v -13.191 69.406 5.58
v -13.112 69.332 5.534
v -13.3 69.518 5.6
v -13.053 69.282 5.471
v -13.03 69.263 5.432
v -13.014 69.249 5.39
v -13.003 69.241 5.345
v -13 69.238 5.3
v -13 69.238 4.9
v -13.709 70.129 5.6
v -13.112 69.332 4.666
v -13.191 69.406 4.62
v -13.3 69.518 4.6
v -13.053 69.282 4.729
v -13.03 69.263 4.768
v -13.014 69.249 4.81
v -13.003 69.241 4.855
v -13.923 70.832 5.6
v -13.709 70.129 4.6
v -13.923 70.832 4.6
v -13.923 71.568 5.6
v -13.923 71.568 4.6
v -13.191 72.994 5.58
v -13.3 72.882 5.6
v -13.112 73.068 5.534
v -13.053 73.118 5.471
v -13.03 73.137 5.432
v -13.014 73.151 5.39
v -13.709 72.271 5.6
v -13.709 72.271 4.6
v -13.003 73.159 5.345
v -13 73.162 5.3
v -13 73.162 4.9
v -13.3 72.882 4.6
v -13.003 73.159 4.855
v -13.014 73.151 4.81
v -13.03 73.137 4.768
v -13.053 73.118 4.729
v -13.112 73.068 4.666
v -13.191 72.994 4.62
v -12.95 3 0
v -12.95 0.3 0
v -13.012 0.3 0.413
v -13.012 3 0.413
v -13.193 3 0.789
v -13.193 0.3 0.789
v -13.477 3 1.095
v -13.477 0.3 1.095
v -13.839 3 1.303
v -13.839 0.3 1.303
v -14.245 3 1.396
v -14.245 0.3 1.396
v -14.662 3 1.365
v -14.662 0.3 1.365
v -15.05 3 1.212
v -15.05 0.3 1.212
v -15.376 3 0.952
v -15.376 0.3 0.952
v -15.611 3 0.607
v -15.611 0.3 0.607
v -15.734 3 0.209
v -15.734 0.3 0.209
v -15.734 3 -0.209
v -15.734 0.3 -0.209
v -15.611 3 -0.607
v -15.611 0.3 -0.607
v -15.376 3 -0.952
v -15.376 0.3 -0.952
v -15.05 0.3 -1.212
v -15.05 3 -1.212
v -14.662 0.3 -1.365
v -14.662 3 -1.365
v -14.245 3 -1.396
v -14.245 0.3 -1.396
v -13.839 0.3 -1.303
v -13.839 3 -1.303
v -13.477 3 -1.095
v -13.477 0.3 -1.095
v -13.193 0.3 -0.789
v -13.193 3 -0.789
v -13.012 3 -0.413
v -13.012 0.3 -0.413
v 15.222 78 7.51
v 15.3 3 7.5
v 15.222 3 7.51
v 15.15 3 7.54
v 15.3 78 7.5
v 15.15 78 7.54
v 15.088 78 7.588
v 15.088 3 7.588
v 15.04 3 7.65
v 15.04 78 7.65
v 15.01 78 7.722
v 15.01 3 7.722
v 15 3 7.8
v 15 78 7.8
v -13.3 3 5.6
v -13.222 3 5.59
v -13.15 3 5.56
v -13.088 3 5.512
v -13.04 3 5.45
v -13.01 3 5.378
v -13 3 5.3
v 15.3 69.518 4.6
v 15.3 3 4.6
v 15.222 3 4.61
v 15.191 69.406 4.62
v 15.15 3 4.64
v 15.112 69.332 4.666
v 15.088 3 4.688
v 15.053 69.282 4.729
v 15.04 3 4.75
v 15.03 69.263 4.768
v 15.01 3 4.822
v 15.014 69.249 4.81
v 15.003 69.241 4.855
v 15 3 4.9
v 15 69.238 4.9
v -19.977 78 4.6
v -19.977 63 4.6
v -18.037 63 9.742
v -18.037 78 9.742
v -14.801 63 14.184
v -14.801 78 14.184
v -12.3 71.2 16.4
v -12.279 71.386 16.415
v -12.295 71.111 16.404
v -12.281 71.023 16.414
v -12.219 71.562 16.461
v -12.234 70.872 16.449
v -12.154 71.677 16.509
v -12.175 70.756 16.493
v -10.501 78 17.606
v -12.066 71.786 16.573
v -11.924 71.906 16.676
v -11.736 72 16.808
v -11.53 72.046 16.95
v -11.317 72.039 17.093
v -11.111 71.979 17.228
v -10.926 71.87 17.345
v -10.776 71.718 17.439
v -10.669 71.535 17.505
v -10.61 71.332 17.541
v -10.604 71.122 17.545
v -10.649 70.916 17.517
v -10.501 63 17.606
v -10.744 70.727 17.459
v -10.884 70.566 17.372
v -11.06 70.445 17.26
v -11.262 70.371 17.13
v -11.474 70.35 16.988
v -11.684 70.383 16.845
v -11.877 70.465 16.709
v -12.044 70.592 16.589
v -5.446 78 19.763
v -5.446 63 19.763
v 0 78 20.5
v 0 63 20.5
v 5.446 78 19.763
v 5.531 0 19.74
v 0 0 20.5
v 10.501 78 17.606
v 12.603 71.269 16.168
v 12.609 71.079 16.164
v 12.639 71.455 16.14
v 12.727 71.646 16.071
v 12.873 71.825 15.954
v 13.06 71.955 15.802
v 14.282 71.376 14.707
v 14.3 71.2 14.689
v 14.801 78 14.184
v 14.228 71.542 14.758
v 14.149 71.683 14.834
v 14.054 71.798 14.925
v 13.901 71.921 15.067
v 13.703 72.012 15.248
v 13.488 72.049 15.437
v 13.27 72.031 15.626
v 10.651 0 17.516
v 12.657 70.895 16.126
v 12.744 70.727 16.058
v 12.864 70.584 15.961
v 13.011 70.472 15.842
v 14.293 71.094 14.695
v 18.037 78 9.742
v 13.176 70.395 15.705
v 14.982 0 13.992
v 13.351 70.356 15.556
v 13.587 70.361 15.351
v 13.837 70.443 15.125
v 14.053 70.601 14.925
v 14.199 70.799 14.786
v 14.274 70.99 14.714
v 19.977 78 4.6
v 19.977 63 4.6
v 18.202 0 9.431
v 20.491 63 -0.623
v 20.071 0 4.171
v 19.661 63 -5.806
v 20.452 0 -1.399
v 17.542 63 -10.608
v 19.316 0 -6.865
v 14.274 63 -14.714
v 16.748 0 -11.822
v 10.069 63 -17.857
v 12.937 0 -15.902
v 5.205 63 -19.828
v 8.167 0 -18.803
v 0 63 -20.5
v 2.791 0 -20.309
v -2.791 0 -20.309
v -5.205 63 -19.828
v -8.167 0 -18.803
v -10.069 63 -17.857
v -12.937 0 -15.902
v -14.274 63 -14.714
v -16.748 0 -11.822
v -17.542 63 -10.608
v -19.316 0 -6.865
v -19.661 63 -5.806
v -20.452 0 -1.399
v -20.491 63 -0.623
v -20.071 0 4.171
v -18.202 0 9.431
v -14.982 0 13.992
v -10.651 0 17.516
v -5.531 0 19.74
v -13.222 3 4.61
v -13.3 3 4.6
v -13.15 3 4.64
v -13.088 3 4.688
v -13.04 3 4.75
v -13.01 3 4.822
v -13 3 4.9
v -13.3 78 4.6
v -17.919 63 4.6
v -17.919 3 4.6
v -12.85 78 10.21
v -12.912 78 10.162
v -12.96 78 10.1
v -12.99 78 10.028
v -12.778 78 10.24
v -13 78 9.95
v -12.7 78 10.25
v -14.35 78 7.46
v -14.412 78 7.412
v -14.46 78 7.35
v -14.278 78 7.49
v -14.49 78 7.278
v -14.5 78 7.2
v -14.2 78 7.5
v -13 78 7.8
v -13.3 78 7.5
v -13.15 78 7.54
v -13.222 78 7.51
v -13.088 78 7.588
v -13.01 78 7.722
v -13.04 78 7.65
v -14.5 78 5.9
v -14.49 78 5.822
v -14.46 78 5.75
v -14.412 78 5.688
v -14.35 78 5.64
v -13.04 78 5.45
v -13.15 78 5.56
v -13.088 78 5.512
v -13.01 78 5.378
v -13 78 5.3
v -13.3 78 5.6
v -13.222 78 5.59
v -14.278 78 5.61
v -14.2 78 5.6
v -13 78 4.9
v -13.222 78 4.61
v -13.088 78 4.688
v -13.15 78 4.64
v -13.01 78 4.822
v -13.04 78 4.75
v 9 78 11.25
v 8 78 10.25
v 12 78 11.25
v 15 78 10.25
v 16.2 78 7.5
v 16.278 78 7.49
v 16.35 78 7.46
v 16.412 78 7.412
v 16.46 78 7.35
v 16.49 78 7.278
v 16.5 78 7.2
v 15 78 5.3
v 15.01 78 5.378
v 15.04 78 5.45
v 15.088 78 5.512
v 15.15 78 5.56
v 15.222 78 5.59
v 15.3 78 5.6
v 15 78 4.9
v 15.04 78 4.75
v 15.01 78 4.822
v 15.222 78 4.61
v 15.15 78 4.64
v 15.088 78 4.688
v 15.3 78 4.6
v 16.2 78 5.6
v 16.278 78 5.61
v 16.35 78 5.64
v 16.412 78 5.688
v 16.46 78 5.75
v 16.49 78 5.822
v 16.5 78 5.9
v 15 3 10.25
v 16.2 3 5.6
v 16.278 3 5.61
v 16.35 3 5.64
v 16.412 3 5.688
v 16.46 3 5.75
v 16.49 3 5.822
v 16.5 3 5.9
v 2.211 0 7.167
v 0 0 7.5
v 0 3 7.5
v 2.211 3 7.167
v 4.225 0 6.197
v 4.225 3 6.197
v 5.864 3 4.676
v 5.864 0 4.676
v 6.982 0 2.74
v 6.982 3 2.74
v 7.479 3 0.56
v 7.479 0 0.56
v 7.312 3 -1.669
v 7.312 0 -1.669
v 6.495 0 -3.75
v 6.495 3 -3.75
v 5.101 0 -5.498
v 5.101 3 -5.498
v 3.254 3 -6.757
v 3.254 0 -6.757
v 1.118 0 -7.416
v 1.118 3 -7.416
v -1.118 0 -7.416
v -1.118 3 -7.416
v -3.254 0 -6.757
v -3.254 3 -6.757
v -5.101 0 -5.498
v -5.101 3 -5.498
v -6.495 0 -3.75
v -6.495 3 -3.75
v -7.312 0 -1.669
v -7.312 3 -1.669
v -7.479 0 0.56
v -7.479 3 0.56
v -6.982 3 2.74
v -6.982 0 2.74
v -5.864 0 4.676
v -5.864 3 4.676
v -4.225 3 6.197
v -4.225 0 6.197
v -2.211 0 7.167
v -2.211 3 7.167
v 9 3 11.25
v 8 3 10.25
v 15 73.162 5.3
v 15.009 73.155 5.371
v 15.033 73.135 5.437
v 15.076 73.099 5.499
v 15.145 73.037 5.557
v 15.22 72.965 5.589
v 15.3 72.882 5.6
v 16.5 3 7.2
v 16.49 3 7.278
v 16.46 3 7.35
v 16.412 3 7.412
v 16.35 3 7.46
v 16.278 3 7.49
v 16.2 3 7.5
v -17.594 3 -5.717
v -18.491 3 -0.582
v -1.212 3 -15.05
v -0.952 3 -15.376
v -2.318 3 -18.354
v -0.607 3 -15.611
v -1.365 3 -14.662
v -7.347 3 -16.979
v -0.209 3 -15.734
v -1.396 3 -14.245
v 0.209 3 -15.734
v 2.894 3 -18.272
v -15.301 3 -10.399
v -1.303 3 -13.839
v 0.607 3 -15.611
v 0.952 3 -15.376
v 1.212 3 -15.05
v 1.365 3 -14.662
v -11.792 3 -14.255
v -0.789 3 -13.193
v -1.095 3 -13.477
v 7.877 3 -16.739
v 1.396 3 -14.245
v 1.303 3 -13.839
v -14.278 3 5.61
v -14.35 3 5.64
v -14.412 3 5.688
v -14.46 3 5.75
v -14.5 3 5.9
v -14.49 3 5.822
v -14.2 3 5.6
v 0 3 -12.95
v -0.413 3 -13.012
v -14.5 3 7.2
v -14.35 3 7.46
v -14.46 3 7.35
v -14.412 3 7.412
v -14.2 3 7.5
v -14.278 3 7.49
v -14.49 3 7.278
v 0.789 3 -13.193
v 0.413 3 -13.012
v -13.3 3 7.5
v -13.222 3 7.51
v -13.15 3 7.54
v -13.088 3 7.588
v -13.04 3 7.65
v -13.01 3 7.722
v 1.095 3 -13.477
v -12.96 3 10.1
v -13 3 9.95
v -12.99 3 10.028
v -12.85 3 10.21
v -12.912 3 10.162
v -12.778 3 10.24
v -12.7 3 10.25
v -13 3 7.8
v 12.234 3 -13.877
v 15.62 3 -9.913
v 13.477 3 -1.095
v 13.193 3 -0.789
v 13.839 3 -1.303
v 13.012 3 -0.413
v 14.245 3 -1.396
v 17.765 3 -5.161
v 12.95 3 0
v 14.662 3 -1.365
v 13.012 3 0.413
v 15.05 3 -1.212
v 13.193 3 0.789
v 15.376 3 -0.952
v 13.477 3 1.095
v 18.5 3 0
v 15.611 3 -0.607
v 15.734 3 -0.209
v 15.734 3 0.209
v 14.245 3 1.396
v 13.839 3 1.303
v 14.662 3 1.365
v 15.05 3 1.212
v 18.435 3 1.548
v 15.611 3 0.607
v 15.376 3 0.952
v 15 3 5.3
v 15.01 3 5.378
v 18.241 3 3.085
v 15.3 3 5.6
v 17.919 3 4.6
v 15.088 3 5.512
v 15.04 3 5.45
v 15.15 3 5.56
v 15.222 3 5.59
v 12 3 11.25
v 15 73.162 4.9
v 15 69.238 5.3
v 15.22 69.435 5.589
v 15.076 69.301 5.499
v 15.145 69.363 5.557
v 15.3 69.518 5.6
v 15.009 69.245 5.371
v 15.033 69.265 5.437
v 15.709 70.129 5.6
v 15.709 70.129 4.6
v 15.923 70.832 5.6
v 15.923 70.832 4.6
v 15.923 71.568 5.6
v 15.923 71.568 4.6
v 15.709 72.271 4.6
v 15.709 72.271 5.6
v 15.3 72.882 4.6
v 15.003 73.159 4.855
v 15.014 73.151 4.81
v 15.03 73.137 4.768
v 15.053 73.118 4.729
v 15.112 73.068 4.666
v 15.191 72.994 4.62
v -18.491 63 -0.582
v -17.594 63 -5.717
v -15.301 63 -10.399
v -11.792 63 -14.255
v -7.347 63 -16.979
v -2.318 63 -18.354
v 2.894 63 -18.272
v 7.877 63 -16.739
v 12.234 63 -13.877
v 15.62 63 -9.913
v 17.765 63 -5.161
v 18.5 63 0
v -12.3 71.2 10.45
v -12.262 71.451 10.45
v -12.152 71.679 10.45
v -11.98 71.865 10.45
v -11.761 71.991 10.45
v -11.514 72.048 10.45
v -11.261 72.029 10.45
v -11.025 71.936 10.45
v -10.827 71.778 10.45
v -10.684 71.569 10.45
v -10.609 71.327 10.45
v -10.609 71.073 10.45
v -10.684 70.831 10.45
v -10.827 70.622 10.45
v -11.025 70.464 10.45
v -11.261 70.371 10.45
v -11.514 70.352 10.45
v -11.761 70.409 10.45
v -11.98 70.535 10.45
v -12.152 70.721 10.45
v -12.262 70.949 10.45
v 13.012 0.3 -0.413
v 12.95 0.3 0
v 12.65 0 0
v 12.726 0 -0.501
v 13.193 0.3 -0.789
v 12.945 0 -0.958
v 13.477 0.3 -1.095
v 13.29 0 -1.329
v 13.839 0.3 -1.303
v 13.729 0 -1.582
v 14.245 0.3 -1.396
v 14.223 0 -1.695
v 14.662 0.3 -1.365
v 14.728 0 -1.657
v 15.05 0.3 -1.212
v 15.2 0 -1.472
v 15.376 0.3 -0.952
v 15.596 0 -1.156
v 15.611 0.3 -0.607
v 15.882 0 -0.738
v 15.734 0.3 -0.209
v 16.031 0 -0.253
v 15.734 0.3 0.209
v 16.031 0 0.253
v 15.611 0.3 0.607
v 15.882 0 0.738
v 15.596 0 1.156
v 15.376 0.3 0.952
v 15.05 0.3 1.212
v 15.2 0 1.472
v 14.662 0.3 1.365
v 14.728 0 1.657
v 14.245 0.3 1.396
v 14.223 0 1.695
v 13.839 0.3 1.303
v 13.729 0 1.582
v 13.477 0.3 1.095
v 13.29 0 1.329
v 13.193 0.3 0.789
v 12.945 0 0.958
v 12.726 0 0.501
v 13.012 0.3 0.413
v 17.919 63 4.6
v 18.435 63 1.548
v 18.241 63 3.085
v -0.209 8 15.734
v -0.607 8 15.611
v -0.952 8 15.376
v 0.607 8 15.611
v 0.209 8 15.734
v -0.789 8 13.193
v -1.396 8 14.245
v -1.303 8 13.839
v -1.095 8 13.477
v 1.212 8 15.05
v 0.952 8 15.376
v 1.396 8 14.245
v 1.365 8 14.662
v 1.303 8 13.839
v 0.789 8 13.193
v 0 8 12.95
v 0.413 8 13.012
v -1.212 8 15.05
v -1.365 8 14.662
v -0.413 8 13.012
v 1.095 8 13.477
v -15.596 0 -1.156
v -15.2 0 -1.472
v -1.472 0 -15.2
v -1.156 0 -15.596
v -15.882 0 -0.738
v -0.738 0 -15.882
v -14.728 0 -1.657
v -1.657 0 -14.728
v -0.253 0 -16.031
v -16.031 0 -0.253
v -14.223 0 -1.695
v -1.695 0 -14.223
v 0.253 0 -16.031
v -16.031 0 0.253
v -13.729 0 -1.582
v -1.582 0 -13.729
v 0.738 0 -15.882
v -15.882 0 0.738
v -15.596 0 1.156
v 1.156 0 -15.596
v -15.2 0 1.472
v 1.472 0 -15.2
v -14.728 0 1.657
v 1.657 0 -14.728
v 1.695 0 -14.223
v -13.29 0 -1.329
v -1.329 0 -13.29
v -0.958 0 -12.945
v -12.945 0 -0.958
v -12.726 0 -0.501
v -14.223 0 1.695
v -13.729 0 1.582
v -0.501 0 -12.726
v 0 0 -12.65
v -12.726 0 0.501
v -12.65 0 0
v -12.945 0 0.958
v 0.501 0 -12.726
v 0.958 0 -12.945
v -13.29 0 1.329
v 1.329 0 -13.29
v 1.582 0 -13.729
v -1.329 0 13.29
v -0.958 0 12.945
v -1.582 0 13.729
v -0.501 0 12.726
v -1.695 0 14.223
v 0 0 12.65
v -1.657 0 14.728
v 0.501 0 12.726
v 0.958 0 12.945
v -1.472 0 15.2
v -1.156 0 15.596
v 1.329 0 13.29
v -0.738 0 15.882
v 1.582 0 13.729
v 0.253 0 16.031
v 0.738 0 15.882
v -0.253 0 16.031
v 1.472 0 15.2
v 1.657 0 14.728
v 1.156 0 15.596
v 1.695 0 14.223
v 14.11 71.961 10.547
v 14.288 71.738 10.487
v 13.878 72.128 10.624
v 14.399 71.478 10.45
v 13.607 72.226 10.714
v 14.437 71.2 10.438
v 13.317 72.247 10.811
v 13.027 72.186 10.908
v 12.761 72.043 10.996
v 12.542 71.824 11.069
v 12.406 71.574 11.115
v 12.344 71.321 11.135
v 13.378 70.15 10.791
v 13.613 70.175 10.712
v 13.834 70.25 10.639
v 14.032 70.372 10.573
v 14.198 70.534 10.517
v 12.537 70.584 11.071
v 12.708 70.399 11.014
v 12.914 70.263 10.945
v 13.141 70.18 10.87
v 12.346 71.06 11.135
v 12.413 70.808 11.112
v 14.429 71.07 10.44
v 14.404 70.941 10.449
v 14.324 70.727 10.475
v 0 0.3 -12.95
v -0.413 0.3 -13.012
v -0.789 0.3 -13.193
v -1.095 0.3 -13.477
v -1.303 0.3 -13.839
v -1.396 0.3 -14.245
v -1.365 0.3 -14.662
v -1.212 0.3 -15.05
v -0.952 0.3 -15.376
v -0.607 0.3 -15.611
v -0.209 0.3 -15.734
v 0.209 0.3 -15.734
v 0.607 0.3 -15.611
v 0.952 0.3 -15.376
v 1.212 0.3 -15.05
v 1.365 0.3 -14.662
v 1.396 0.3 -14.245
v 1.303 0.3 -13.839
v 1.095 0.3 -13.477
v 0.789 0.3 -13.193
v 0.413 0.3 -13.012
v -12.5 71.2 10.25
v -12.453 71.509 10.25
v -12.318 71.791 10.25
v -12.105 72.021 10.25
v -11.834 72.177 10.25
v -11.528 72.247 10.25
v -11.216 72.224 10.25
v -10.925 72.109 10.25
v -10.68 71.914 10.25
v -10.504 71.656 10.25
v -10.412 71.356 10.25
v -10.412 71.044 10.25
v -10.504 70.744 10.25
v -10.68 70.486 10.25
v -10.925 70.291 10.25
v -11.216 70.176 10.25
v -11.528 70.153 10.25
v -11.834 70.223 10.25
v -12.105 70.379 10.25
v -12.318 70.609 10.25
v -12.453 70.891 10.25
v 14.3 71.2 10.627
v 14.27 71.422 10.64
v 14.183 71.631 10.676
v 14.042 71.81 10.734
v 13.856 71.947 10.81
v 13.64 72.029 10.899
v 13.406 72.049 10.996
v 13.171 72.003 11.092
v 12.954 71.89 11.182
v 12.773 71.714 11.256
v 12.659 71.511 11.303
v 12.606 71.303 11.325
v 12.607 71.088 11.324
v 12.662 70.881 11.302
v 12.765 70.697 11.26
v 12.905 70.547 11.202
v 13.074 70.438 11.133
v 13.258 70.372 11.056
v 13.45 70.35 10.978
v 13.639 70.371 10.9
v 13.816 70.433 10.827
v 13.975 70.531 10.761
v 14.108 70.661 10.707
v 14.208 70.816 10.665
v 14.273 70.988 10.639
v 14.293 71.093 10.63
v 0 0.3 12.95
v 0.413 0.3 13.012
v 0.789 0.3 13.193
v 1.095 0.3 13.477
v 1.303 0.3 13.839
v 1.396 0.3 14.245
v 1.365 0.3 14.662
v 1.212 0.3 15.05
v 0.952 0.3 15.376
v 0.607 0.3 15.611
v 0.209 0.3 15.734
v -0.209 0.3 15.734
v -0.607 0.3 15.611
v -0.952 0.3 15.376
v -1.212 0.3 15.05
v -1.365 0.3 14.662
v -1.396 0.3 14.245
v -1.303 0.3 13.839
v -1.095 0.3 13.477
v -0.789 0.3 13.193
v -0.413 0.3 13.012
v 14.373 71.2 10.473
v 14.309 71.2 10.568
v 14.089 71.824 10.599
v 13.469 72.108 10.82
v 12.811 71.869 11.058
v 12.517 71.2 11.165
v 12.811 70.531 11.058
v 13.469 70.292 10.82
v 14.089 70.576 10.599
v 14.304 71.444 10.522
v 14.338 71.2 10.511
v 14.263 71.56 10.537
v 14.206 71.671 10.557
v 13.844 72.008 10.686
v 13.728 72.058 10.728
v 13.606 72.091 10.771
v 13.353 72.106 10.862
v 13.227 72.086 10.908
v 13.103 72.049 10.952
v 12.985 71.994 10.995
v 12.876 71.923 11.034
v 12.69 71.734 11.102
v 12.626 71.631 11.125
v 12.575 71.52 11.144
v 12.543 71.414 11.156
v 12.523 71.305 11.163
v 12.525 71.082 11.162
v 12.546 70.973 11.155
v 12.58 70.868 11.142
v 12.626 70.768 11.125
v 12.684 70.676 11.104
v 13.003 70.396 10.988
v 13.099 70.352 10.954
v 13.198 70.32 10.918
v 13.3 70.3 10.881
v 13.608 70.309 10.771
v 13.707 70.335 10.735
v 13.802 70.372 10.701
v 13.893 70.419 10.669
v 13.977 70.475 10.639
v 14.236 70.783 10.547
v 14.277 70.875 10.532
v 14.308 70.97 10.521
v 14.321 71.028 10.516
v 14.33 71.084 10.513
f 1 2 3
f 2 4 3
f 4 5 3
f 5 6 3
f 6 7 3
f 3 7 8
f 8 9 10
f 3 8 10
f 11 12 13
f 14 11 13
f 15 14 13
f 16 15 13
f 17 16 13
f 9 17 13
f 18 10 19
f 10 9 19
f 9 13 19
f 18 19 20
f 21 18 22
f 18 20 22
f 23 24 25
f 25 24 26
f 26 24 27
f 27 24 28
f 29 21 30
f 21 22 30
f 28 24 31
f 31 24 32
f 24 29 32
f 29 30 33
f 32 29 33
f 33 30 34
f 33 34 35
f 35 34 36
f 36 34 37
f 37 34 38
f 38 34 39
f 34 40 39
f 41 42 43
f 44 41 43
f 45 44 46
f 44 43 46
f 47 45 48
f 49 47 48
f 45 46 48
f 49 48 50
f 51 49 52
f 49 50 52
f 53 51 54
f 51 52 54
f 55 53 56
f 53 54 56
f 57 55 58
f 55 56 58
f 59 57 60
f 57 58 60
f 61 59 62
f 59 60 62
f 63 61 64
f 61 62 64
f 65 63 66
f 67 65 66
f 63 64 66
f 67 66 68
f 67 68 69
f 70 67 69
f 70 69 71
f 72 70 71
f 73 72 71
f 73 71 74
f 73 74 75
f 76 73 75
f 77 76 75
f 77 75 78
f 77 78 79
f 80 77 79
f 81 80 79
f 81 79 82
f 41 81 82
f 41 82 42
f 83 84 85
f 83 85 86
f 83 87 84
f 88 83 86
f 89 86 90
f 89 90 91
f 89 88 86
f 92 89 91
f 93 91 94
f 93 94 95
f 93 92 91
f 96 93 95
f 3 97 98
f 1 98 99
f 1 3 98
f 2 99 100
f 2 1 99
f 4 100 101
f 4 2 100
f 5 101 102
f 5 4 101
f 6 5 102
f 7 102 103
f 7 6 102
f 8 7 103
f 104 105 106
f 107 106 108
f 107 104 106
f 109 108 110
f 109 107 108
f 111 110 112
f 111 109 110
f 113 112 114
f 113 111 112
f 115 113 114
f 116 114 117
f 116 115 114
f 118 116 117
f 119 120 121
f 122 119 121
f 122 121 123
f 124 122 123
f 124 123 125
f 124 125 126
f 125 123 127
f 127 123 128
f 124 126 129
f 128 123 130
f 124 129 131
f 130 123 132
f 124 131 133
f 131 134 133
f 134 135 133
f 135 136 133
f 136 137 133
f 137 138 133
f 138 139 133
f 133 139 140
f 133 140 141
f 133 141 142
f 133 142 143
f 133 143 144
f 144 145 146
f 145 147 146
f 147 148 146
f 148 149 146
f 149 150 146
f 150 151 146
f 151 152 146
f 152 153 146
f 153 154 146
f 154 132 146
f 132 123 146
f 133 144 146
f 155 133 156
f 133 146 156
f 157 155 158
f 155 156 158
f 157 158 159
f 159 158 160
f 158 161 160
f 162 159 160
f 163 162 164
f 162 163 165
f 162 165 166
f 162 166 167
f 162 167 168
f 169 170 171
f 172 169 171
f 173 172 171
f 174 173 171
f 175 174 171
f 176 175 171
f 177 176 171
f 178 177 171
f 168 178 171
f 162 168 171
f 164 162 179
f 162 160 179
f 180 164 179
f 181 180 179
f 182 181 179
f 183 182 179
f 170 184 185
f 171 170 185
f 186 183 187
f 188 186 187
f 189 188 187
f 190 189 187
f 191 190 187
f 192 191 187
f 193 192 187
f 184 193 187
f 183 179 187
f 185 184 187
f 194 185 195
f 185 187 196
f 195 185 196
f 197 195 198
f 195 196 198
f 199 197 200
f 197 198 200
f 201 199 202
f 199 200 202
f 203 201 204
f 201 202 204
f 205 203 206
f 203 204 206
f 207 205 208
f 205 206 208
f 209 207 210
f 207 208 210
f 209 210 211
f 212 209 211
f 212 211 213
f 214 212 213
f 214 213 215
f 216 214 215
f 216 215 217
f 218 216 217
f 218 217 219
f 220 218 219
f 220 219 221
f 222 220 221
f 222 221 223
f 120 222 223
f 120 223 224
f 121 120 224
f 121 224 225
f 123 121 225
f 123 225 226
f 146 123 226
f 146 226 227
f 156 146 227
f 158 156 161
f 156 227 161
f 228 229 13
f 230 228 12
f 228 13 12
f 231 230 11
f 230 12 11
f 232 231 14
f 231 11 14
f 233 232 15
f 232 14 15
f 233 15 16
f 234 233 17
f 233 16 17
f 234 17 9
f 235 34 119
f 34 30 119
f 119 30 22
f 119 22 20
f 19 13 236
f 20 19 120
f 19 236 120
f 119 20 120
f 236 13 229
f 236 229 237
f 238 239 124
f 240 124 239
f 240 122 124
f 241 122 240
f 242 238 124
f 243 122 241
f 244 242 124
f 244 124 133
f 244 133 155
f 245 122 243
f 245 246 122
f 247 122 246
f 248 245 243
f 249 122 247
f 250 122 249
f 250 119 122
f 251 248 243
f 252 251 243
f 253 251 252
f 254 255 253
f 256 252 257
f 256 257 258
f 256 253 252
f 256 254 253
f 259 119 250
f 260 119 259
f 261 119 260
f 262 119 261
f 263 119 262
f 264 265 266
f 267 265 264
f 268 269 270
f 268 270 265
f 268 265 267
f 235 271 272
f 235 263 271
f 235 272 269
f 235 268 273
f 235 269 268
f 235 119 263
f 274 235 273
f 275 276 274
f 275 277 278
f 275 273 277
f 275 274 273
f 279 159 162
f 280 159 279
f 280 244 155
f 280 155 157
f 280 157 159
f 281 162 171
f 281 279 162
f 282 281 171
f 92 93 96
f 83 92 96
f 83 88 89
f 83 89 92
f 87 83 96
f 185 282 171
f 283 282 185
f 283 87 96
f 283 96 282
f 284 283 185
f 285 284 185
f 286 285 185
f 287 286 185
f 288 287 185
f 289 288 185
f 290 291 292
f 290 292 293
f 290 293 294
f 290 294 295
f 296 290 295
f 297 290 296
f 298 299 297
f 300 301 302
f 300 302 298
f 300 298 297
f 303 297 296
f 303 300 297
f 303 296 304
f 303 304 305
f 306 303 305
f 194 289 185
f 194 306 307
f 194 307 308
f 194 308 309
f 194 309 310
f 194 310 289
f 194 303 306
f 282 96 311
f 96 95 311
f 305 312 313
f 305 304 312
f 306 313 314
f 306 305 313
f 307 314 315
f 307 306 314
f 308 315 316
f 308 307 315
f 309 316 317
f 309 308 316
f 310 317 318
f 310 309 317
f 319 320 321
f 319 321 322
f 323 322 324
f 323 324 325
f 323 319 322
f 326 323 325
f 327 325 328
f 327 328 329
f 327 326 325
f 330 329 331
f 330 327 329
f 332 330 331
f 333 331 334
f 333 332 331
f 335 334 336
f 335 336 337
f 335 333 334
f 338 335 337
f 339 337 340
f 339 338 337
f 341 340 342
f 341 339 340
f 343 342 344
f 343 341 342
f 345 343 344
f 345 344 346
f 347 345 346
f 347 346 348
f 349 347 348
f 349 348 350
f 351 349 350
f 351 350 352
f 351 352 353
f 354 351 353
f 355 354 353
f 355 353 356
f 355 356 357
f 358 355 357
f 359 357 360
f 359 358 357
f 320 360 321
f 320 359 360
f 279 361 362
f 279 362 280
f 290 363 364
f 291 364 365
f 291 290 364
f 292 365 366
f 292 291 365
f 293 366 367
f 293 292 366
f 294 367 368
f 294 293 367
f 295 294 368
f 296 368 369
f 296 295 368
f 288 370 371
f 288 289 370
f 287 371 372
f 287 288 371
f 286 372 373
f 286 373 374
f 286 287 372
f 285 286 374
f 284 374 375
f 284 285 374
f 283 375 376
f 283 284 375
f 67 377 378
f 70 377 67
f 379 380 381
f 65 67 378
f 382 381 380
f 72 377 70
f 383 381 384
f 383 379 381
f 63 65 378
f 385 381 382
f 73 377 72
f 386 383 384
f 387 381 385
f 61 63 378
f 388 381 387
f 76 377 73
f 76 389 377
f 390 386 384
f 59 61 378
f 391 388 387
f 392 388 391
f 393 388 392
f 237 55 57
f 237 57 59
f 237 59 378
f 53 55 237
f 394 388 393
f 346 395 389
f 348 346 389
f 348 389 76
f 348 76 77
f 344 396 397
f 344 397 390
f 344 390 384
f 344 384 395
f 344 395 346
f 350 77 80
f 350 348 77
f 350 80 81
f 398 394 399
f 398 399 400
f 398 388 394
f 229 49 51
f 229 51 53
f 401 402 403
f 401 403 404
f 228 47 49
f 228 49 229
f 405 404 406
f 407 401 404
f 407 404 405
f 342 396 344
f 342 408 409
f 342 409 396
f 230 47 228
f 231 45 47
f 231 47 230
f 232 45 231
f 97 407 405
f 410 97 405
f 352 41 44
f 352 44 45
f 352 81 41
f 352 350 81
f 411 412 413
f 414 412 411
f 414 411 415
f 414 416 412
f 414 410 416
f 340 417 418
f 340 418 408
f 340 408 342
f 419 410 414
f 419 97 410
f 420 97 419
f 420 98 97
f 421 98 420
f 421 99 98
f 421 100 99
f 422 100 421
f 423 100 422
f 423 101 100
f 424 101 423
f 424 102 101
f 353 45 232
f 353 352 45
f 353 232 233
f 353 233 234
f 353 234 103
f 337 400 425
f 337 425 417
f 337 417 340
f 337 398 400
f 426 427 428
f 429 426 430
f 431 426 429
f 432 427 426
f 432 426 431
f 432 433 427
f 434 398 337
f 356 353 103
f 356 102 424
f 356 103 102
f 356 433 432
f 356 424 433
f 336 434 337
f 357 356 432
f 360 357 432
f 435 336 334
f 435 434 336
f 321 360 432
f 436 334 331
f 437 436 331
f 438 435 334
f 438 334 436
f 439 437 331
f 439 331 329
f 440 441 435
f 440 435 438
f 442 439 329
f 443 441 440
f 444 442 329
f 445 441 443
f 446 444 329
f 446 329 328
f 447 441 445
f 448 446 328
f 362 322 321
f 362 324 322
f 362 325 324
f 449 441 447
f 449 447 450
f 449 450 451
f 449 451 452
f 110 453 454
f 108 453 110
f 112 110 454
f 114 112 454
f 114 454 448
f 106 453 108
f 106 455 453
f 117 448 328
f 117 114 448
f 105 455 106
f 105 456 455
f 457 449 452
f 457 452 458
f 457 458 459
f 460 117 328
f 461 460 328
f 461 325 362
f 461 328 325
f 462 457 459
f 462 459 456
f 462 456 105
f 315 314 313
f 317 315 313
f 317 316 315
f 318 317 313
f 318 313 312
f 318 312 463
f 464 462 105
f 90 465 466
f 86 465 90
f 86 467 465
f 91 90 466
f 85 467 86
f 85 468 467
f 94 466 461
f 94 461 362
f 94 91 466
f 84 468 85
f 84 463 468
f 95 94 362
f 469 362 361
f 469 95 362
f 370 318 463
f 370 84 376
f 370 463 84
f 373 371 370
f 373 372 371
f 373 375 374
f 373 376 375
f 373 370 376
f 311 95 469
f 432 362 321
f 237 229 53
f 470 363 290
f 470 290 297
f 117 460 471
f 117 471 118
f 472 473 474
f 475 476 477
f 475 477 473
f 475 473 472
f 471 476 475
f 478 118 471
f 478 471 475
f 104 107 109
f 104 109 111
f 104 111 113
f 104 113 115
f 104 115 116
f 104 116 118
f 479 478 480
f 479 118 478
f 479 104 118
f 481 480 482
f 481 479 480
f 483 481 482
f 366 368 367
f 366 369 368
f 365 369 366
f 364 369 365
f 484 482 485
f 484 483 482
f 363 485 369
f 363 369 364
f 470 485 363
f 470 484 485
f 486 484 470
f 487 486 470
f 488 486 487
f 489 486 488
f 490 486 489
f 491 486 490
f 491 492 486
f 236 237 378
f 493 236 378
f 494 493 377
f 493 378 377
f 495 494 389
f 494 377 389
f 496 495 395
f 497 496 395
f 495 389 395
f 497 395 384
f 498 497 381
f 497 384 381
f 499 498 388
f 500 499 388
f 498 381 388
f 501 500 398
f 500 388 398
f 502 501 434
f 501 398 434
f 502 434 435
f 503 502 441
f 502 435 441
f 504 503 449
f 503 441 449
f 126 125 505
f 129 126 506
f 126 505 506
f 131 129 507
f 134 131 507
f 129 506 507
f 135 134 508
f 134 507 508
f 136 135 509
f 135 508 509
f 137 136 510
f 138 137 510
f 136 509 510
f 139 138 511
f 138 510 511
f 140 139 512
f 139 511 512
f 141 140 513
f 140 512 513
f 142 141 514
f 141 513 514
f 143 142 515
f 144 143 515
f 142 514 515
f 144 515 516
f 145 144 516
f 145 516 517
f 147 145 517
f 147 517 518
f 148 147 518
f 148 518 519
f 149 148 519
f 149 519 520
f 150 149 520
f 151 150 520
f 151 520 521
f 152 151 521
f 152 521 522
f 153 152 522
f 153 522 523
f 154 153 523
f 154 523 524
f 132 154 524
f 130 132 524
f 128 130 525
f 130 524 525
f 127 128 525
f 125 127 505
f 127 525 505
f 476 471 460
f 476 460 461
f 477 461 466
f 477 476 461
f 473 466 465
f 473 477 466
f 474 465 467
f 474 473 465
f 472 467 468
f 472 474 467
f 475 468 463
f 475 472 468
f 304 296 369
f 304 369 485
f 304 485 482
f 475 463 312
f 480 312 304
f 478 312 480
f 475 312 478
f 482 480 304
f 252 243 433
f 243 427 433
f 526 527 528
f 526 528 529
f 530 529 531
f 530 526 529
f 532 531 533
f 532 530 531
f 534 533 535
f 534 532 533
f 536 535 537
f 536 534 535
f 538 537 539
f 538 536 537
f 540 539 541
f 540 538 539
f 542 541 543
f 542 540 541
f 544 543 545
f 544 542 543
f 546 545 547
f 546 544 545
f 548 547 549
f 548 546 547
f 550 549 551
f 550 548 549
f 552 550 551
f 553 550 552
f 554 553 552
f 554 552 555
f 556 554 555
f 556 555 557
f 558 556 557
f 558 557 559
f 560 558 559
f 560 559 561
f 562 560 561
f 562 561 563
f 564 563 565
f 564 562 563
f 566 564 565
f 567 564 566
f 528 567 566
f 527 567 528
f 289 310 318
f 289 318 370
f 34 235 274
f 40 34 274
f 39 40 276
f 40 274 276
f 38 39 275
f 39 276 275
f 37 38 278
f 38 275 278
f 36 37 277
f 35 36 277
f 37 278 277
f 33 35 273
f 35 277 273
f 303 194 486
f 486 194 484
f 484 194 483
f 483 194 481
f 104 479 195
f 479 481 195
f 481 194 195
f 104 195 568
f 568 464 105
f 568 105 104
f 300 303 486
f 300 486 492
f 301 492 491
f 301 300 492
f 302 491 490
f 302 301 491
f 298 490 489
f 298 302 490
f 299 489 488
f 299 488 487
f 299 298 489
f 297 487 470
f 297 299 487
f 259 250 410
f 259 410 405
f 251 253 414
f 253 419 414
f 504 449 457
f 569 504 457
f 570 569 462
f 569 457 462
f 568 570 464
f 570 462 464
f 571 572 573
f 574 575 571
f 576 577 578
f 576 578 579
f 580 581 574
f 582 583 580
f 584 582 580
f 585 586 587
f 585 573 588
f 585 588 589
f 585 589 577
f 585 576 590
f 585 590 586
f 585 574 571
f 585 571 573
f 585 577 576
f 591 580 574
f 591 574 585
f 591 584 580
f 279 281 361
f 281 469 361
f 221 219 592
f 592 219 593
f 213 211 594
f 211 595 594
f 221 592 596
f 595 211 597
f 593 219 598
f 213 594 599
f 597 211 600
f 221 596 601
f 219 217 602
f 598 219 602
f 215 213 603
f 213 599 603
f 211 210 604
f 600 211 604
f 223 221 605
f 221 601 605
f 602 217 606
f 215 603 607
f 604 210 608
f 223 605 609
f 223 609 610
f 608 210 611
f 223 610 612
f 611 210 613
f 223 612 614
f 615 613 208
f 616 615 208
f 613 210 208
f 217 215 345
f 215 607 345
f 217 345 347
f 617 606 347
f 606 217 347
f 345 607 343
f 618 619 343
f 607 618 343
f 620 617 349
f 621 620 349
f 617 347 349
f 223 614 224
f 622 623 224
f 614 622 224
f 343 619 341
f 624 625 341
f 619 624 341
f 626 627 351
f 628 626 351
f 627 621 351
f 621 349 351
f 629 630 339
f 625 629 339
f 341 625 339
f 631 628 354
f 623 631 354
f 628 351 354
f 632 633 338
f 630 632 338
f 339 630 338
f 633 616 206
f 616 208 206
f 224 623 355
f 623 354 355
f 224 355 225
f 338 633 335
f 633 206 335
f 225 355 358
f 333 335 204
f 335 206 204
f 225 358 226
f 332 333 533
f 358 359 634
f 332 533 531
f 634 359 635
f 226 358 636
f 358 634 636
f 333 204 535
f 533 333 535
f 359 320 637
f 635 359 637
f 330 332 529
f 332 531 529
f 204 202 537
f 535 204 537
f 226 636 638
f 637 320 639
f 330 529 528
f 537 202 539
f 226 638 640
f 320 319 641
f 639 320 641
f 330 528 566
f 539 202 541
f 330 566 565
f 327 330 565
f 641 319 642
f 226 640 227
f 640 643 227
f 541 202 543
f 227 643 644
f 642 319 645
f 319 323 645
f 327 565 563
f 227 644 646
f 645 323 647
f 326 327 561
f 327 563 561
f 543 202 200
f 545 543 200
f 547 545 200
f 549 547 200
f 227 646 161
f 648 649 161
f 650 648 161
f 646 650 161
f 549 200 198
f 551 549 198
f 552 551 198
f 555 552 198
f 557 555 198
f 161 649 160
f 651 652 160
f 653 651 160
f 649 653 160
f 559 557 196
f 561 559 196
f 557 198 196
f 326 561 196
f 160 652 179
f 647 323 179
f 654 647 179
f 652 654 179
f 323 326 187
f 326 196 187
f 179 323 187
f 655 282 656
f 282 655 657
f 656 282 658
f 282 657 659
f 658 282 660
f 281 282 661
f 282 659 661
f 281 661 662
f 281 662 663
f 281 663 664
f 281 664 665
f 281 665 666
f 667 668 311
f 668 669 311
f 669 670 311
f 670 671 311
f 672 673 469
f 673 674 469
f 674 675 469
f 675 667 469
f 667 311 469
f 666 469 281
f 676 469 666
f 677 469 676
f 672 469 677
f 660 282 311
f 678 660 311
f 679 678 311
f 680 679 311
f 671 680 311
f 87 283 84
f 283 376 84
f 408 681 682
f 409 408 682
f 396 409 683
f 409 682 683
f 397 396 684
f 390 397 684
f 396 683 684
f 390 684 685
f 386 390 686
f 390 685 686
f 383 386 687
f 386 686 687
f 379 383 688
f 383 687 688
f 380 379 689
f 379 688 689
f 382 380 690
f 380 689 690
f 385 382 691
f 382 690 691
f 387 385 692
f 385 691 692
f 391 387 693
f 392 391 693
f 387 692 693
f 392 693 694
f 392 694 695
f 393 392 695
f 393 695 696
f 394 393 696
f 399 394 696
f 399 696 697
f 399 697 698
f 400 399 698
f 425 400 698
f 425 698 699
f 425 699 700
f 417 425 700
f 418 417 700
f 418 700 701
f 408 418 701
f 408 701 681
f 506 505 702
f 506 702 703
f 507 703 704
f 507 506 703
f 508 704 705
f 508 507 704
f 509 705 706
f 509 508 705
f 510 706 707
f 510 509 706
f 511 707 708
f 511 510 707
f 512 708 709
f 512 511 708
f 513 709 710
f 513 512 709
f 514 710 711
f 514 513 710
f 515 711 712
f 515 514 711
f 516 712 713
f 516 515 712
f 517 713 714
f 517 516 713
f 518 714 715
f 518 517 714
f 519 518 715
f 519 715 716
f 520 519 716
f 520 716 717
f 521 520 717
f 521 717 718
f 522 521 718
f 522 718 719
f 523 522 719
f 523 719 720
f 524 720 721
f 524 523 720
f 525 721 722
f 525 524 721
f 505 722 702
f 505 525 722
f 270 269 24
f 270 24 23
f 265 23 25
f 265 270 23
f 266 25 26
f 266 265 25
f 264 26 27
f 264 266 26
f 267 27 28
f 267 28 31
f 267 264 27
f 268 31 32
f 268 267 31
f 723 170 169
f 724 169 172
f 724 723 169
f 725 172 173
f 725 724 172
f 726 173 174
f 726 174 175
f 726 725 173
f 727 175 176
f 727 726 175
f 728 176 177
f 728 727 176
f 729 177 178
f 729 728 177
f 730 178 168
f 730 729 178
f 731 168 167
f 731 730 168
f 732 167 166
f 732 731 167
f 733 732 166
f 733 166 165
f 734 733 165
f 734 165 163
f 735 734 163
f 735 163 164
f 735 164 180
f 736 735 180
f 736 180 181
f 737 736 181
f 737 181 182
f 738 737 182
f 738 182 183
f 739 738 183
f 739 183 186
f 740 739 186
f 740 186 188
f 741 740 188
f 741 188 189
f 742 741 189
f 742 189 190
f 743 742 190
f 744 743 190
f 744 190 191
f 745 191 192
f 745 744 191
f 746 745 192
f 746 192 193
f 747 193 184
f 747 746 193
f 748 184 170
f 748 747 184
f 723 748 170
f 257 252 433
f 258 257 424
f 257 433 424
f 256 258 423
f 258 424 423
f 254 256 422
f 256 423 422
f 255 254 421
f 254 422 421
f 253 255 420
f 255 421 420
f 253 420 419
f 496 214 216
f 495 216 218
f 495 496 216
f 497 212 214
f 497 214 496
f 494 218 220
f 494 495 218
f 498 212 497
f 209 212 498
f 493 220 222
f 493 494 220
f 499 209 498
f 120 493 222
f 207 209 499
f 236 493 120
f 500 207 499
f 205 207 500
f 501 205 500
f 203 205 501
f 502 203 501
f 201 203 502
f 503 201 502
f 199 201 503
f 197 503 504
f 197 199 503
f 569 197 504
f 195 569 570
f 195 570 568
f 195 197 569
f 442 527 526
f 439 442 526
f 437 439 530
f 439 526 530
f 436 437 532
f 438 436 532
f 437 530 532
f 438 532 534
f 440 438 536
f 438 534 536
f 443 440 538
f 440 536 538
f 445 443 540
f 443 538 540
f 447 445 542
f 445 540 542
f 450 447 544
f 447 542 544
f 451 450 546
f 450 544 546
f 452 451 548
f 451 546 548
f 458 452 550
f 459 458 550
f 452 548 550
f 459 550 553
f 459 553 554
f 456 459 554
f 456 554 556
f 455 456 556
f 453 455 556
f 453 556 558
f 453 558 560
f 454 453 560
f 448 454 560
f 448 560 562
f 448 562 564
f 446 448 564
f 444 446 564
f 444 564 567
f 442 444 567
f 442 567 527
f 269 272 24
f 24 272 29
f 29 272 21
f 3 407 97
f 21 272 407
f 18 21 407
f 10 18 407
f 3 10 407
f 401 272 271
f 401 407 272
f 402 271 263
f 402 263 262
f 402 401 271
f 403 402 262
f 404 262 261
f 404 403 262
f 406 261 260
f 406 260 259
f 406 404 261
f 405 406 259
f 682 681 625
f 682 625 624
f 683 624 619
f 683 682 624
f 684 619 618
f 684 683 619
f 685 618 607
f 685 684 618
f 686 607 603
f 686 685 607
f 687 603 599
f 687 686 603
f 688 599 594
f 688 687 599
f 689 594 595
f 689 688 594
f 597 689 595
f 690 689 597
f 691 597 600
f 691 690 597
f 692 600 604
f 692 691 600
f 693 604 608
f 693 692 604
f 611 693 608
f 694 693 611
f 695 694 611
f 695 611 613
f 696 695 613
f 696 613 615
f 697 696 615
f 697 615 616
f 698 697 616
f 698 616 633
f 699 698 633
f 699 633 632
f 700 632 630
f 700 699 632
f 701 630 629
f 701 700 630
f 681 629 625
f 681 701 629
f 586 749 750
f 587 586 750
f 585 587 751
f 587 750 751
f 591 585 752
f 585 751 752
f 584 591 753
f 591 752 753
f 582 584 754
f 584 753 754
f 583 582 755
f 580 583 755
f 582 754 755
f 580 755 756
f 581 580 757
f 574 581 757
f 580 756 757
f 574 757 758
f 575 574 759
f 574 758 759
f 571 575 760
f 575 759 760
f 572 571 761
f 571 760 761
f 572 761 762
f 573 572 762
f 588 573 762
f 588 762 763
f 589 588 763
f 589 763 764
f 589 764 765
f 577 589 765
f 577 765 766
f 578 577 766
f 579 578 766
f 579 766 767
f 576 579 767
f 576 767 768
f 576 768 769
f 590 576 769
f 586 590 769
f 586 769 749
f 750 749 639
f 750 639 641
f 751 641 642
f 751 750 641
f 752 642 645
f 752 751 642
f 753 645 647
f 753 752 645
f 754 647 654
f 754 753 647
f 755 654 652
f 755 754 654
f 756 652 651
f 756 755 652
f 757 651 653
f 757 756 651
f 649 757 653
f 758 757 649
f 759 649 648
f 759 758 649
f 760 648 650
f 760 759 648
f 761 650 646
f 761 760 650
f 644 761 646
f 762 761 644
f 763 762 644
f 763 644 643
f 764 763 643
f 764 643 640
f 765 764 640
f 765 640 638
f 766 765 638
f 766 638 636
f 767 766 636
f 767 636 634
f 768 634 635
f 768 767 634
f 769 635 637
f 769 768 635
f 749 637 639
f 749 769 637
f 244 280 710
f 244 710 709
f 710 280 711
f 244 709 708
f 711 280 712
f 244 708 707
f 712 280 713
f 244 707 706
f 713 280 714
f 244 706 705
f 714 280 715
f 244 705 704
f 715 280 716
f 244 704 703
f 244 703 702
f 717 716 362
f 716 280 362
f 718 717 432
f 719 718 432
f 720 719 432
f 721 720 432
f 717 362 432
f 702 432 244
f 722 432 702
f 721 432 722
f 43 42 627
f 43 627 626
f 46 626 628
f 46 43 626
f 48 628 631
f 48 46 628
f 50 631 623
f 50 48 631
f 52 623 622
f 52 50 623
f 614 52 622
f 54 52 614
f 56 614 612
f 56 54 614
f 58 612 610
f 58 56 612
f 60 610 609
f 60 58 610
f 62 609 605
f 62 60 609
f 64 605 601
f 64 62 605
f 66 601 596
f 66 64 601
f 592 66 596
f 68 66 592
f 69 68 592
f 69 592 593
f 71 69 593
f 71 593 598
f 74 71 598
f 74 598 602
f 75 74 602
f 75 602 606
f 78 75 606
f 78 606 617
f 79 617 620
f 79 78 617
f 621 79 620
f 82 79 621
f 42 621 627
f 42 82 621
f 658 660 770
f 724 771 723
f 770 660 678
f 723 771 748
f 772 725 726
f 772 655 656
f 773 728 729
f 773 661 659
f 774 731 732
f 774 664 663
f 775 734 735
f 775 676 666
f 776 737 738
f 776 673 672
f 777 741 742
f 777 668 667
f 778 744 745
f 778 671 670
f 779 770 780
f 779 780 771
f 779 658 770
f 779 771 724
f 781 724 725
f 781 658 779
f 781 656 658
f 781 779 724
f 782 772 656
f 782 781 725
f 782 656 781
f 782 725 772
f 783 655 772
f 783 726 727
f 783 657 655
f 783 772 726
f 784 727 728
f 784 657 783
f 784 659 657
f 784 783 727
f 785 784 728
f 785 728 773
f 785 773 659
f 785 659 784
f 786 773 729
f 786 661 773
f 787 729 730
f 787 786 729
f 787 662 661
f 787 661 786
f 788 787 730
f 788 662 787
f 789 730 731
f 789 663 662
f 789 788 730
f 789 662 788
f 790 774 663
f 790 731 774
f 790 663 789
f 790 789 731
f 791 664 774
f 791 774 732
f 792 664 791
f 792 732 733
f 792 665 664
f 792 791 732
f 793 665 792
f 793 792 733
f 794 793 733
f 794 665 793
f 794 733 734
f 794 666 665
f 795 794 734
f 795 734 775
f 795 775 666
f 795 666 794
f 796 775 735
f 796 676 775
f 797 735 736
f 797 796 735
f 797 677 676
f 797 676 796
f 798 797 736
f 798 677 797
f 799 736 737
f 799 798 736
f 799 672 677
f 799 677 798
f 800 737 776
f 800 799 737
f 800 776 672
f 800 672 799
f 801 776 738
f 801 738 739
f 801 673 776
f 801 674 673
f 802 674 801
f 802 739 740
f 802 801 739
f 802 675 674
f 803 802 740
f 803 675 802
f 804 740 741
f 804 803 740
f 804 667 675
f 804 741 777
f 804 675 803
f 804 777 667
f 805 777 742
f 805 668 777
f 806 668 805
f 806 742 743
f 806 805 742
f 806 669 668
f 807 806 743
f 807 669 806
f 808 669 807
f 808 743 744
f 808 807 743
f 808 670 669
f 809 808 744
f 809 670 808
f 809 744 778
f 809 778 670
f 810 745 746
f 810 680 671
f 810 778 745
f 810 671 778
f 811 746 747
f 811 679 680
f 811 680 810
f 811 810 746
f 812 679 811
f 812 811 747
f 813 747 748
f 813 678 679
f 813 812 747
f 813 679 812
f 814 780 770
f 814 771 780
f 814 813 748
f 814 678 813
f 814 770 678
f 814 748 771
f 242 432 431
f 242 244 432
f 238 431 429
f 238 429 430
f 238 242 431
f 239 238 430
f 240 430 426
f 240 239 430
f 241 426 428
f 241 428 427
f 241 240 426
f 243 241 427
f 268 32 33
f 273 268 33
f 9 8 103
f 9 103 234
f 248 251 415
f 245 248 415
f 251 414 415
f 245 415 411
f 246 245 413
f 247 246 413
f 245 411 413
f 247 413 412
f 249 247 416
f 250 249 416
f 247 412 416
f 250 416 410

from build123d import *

# Parameters (mm, degrees)
SKETCH1_R                    = 20.5
SKETCH1_R_2                  = 7.5
BOSS_EXTRUDE1_DEPTH          = 3
SKETCH3_R                    = 1.4
CUT_EXTRUDE1_DEPTH           = 5
CHAMFER6_SIZE                = 0.3
CIRPATTERN2_COUNT            = 4
CHAMFER6_OF_CIRPATTERN2_SIZE = 0.3
SKETCH4_R                    = 20.5
SKETCH4_R_2                  = 1.4
SKETCH4_W                    = 1.5
SKETCH4_H                    = 1
BOSS_EXTRUDE2_DEPTH          = 60
SKETCH6_W                    = 1.5
SKETCH6_H                    = 1
BOSS_EXTRUDE4_DEPTH          = 15
FILLET1_R                    = 0.3
SKETCH7_R                    = 2.5
CUT_EXTRUDE2_DEPTH           = 1.5
SKETCH8_R                    = 0.85
CUT_EXTRUDE3_DEPTH           = 86.371248179
CHAMFER2_SIZE                = 0.2
CHAMFER4_SIZE                = 1
CHAMFER5_R                   = 0.2
SKETCH9_R                    = 1.4
CUT_EXTRUDE4_DEPTH           = 5


with BuildPart() as part:
    # Sketch1 → Boss-Extrude1 (new body)
    with BuildSketch(Plane(origin=(0, 0, 0), x_dir=(1, 0, 0), z_dir=(0, 1, 0))):
        with Locations(Location((0, 0, 0), (0, 0, 270))):
            Circle(SKETCH1_R)
        with Locations(Location((0, 0, 0), (0, 0, 270))):
            Circle(SKETCH1_R_2, mode=Mode.SUBTRACT)
    extrude(amount=BOSS_EXTRUDE1_DEPTH)

    # Sketch3 → Cut-Extrude1 (cut)
    with BuildSketch(Plane.XZ):
        with Locations(Location((0, 14.35, 0), (0, 0, 270))):
            Circle(SKETCH3_R)
    cut_extrude1 = extrude(amount=-CUT_EXTRUDE1_DEPTH, mode=Mode.SUBTRACT)

    # Chamfer6
    chamfer6_edges = [part.edges().sort_by_distance(p)[0] for p in [
        (0, 0, 15.75),
    ]]
    chamfer(chamfer6_edges, length=CHAMFER6_SIZE)

    # CirPattern2: Cut-Extrude1 ×4 about axis
    cirpattern2_axis = Axis((0, 0, 0), (0, 1, 0))
    for i in range(1, CIRPATTERN2_COUNT):
        add(cut_extrude1.rotate(cirpattern2_axis, i * 360 / CIRPATTERN2_COUNT), mode=Mode.SUBTRACT)

    # Chamfer6 of CirPattern2
    chamfer6_of_cirpattern2_edges = [part.edges().sort_by_distance(p)[0] for p in [
        (15.75, 0, 0),
        (0, 0, -15.75),
        (-15.75, 0, 0),
    ]]
    chamfer(chamfer6_of_cirpattern2_edges, length=CHAMFER6_OF_CIRPATTERN2_SIZE)

    # Sketch4 → Boss-Extrude2 (add)
    # profile 1 of 8: a face of its own
    with BuildSketch(Plane(origin=(0, 3, 0), x_dir=(1, 0, 0), z_dir=(0, 1, 0))):
        with Locations(Location((0, 0, 0), (0, 0, 270))):
            Circle(SKETCH4_R)
        with BuildLine():
            ThreePointArc((14.686303143, -11.25), (-3.697050438, -18.126825923), (-17.918984346, -4.6))
            ThreePointArc((-17.918984346, -4.6), (-2.318274099, 18.35417133), (18.5, 0))
            ThreePointArc((18.5, 0), (18.35417133, -2.318274099), (17.918984346, -4.6))
            ThreePointArc((17.918984346, -4.6), (16.751492877, -7.85095449), (15, -10.828203914))
            Line((15, -10.828203914), (15, -11.25))
            Line((15, -11.25), (14.686303143, -11.25))
        make_face(mode=Mode.SUBTRACT)
    # profile 2 of 8: a face of its own
    with BuildSketch(Plane(origin=(0, 3, 0), x_dir=(1, 0, 0), z_dir=(0, 1, 0))):
        with BuildLine():
            Line((-14.5, -7.5), (-14.5, -5.6))
            Line((-14.5, -5.6), (-14.5, -4.6))
            Line((-14.5, -4.6), (-17.918984346, -4.6))
            ThreePointArc((-17.918984346, -4.6), (-3.697050438, -18.126825923), (14.686303143, -11.25))
            Line((14.686303143, -11.25), (12, -11.25))
            Line((12, -11.25), (9, -11.25))
            Line((9, -11.25), (9, -10.25))
            Line((9, -10.25), (-13, -10.25))
            Line((-13, -10.25), (-13, -7.5))
            Line((-13, -7.5), (-14.5, -7.5))
        make_face()
        with Locations(Location((0, -14.35, 0), (0, 0, 270))):
            Circle(SKETCH4_R_2, mode=Mode.SUBTRACT)
    # profile 3 of 8: a face of its own
    with BuildSketch(Plane(origin=(0, 3, 0), x_dir=(1, 0, 0), z_dir=(0, 1, 0))):
        with BuildLine():
            Line((16.5, -4.6), (16.5, -5.6))
            Line((16.5, -5.6), (16.5, -7.5))
            Line((16.5, -7.5), (15, -7.5))
            Line((15, -7.5), (15, -10.25))
            Line((15, -10.25), (15, -10.828203914))
            ThreePointArc((15, -10.828203914), (16.751492877, -7.85095449), (17.918984346, -4.6))
            Line((17.918984346, -4.6), (16.5, -4.6))
        make_face()
    # profile 4 of 8: a face of its own
    with BuildSketch(Plane(origin=(0, 3, 0), x_dir=(1, 0, 0), z_dir=(0, 1, 0))):
        with BuildLine():
            Line((12, -11.25), (14.686303143, -11.25))
            ThreePointArc((14.686303143, -11.25), (14.844649762, -11.040216187), (15, -10.828203914))
            Line((15, -10.828203914), (15, -10.25))
            Line((15, -10.25), (12, -11.25))
        make_face()
    # profile 5 of 8: a face of its own
    with BuildSketch(Plane(origin=(0, 3, 0), x_dir=(1, 0, 0), z_dir=(0, 1, 0))):
        with Locations((15.75, -5.1)):
            Rectangle(SKETCH4_W, SKETCH4_H)
    # profile 6 of 8: a face of its own
    with BuildSketch(Plane(origin=(0, 3, 0), x_dir=(1, 0, 0), z_dir=(0, 1, 0))):
        with Locations((-13.75, -5.1)):
            Rectangle(SKETCH4_W, SKETCH4_H)
    # profile 7 of 8: a face of its own
    with BuildSketch(Plane(origin=(0, 3, 0), x_dir=(1, 0, 0), z_dir=(0, 1, 0))):
        with Locations(Location((0, -14.35, 0), (0, 0, 270))):
            Circle(SKETCH4_R_2)
    # profile 8 of 8: a face of its own
    with BuildSketch(Plane(origin=(0, 3, 0), x_dir=(1, 0, 0), z_dir=(0, 1, 0))):
        with BuildLine():
            ThreePointArc((15, -10.828203914), (14.844649762, -11.040216187), (14.686303143, -11.25))
            Line((14.686303143, -11.25), (15, -11.25))
            Line((15, -11.25), (15, -10.828203914))
        make_face()
    extrude(amount=BOSS_EXTRUDE2_DEPTH)

    # Sketch6 → Boss-Extrude4 (add)
    with BuildSketch(Plane(origin=(0, 63, 0), x_dir=(1, 0, 0), z_dir=(0, 1, 0))):
        with Locations((-13.75, -5.1)):
            Rectangle(SKETCH6_W, SKETCH6_H)
        with Locations((15.75, -5.1)):
            Rectangle(SKETCH6_W, SKETCH6_H)
        with BuildLine():
            Line((-14.5, -4.6), (-17.918984346, -4.6))
            ThreePointArc((-17.918984346, -4.6), (-3.697050438, -18.126825923), (14.686303143, -11.25))
            Line((14.686303143, -11.25), (12, -11.25))
            Line((12, -11.25), (9, -11.25))
            Line((9, -11.25), (9, -10.25))
            Line((9, -10.25), (-13, -10.25))
            Line((-13, -10.25), (-13, -7.5))
            Line((-13, -7.5), (-14.5, -7.5))
            Line((-14.5, -7.5), (-14.5, -5.6))
            Line((-14.5, -5.6), (-14.5, -4.6))
        make_face()
        with BuildLine():
            ThreePointArc((15, -10.828203914), (14.844649762, -11.040216187), (14.686303143, -11.25))
            Line((14.686303143, -11.25), (15, -11.25))
            Line((15, -11.25), (15, -10.828203914))
        make_face()
        with BuildLine():
            ThreePointArc((15, -10.828203914), (16.751492877, -7.85095449), (17.918984346, -4.6))
            Line((17.918984346, -4.6), (16.5, -4.6))
            Line((16.5, -4.6), (16.5, -5.6))
            Line((16.5, -5.6), (16.5, -7.5))
            Line((16.5, -7.5), (15, -7.5))
            Line((15, -7.5), (15, -10.25))
            Line((15, -10.25), (15, -10.828203914))
        make_face()
        with BuildLine():
            ThreePointArc((14.686303143, -11.25), (-3.697050438, -18.126825923), (-17.918984346, -4.6))
            Line((-17.918984346, -4.6), (-19.977237046, -4.6))
            ThreePointArc((-19.977237046, -4.6), (0, -20.5), (19.977237046, -4.6))
            Line((19.977237046, -4.6), (17.918984346, -4.6))
            ThreePointArc((17.918984346, -4.6), (16.751492877, -7.85095449), (15, -10.828203914))
            Line((15, -10.828203914), (15, -11.25))
            Line((15, -11.25), (14.686303143, -11.25))
        make_face()
        with BuildLine():
            Line((12, -11.25), (14.686303143, -11.25))
            ThreePointArc((14.686303143, -11.25), (14.844649762, -11.040216187), (15, -10.828203914))
            Line((15, -10.828203914), (15, -10.25))
            Line((15, -10.25), (12, -11.25))
        make_face()
    extrude(amount=BOSS_EXTRUDE4_DEPTH)

    # Fillet1
    fillet1_edges = [part.edges().sort_by_distance(p)[0] for p in [
        (15, 40.5, 4.6),
        (15, 40.5, 5.6),
        (16.5, 40.5, 5.6),
        (16.5, 40.5, 7.5),
        (15, 40.5, 7.5),
        (-13, 40.5, 10.25),
        (-13, 40.5, 7.5),
        (-14.5, 40.5, 7.5),
        (-14.5, 40.5, 5.6),
        (-13, 40.5, 5.6),
        (-13, 40.5, 4.6),
    ]]
    fillet(fillet1_edges, radius=FILLET1_R)

    # Sketch7 → Cut-Extrude2 (cut)
    with BuildSketch(Plane(origin=(0, 0, 4.6), x_dir=(-1, 0, 0), z_dir=(0, 0, -1))):
        with Locations((11.45, 71.2)):
            Circle(SKETCH7_R)
    cut_extrude2 = extrude(amount=-CUT_EXTRUDE2_DEPTH, mode=Mode.SUBTRACT)

    # Sketch8 → Cut-Extrude3 (cut, through all)
    with BuildSketch(Plane(origin=(0, 0, 7.5), x_dir=(-1, 0, 0), z_dir=(0, 0, -1))):
        with Locations((11.45, 71.2)):
            Circle(SKETCH8_R)
    cut_extrude3 = extrude(amount=-CUT_EXTRUDE3_DEPTH, mode=Mode.SUBTRACT)

    # Chamfer2
    chamfer2_edges = [part.edges().sort_by_distance(p)[0] for p in [
        (-10.6, 71.2, 10.25),
    ]]
    chamfer(chamfer2_edges, length=CHAMFER2_SIZE)

    # Mirror3: Cut-Extrude2, Cut-Extrude3 across plane
    add(cut_extrude2.mirror(Plane(origin=(1, 0, 0), x_dir=(0, 0, 1), z_dir=(1, 0, 0))), mode=Mode.SUBTRACT)
    add(cut_extrude3.mirror(Plane(origin=(1, 0, 0), x_dir=(0, 0, 1), z_dir=(1, 0, 0))), mode=Mode.SUBTRACT)

    # Chamfer4
    chamfer4_edges = [part.edges().sort_by_distance(p)[0] for p in [
        (9, 40.5, 10.25),
    ]]
    chamfer(chamfer4_edges, length=CHAMFER4_SIZE - 0.0001)  # a hair under: the kernel refuses the full size

    # Chamfer5
    chamfer5_edges = [part.edges().sort_by_distance(p)[0] for p in [
        (12.6, 71.199998189, 11.05),
    ]]
    fillet(chamfer5_edges, radius=CHAMFER5_R)

    # Sketch9 → Cut-Extrude4 (cut)
    with BuildSketch(Plane.XZ.offset(-3)):
        with Locations(Location((0, 14.35, 0), (0, 0, 270))):
            Circle(SKETCH9_R)
    extrude(amount=-CUT_EXTRUDE4_DEPTH, mode=Mode.SUBTRACT)


solid = part.part
